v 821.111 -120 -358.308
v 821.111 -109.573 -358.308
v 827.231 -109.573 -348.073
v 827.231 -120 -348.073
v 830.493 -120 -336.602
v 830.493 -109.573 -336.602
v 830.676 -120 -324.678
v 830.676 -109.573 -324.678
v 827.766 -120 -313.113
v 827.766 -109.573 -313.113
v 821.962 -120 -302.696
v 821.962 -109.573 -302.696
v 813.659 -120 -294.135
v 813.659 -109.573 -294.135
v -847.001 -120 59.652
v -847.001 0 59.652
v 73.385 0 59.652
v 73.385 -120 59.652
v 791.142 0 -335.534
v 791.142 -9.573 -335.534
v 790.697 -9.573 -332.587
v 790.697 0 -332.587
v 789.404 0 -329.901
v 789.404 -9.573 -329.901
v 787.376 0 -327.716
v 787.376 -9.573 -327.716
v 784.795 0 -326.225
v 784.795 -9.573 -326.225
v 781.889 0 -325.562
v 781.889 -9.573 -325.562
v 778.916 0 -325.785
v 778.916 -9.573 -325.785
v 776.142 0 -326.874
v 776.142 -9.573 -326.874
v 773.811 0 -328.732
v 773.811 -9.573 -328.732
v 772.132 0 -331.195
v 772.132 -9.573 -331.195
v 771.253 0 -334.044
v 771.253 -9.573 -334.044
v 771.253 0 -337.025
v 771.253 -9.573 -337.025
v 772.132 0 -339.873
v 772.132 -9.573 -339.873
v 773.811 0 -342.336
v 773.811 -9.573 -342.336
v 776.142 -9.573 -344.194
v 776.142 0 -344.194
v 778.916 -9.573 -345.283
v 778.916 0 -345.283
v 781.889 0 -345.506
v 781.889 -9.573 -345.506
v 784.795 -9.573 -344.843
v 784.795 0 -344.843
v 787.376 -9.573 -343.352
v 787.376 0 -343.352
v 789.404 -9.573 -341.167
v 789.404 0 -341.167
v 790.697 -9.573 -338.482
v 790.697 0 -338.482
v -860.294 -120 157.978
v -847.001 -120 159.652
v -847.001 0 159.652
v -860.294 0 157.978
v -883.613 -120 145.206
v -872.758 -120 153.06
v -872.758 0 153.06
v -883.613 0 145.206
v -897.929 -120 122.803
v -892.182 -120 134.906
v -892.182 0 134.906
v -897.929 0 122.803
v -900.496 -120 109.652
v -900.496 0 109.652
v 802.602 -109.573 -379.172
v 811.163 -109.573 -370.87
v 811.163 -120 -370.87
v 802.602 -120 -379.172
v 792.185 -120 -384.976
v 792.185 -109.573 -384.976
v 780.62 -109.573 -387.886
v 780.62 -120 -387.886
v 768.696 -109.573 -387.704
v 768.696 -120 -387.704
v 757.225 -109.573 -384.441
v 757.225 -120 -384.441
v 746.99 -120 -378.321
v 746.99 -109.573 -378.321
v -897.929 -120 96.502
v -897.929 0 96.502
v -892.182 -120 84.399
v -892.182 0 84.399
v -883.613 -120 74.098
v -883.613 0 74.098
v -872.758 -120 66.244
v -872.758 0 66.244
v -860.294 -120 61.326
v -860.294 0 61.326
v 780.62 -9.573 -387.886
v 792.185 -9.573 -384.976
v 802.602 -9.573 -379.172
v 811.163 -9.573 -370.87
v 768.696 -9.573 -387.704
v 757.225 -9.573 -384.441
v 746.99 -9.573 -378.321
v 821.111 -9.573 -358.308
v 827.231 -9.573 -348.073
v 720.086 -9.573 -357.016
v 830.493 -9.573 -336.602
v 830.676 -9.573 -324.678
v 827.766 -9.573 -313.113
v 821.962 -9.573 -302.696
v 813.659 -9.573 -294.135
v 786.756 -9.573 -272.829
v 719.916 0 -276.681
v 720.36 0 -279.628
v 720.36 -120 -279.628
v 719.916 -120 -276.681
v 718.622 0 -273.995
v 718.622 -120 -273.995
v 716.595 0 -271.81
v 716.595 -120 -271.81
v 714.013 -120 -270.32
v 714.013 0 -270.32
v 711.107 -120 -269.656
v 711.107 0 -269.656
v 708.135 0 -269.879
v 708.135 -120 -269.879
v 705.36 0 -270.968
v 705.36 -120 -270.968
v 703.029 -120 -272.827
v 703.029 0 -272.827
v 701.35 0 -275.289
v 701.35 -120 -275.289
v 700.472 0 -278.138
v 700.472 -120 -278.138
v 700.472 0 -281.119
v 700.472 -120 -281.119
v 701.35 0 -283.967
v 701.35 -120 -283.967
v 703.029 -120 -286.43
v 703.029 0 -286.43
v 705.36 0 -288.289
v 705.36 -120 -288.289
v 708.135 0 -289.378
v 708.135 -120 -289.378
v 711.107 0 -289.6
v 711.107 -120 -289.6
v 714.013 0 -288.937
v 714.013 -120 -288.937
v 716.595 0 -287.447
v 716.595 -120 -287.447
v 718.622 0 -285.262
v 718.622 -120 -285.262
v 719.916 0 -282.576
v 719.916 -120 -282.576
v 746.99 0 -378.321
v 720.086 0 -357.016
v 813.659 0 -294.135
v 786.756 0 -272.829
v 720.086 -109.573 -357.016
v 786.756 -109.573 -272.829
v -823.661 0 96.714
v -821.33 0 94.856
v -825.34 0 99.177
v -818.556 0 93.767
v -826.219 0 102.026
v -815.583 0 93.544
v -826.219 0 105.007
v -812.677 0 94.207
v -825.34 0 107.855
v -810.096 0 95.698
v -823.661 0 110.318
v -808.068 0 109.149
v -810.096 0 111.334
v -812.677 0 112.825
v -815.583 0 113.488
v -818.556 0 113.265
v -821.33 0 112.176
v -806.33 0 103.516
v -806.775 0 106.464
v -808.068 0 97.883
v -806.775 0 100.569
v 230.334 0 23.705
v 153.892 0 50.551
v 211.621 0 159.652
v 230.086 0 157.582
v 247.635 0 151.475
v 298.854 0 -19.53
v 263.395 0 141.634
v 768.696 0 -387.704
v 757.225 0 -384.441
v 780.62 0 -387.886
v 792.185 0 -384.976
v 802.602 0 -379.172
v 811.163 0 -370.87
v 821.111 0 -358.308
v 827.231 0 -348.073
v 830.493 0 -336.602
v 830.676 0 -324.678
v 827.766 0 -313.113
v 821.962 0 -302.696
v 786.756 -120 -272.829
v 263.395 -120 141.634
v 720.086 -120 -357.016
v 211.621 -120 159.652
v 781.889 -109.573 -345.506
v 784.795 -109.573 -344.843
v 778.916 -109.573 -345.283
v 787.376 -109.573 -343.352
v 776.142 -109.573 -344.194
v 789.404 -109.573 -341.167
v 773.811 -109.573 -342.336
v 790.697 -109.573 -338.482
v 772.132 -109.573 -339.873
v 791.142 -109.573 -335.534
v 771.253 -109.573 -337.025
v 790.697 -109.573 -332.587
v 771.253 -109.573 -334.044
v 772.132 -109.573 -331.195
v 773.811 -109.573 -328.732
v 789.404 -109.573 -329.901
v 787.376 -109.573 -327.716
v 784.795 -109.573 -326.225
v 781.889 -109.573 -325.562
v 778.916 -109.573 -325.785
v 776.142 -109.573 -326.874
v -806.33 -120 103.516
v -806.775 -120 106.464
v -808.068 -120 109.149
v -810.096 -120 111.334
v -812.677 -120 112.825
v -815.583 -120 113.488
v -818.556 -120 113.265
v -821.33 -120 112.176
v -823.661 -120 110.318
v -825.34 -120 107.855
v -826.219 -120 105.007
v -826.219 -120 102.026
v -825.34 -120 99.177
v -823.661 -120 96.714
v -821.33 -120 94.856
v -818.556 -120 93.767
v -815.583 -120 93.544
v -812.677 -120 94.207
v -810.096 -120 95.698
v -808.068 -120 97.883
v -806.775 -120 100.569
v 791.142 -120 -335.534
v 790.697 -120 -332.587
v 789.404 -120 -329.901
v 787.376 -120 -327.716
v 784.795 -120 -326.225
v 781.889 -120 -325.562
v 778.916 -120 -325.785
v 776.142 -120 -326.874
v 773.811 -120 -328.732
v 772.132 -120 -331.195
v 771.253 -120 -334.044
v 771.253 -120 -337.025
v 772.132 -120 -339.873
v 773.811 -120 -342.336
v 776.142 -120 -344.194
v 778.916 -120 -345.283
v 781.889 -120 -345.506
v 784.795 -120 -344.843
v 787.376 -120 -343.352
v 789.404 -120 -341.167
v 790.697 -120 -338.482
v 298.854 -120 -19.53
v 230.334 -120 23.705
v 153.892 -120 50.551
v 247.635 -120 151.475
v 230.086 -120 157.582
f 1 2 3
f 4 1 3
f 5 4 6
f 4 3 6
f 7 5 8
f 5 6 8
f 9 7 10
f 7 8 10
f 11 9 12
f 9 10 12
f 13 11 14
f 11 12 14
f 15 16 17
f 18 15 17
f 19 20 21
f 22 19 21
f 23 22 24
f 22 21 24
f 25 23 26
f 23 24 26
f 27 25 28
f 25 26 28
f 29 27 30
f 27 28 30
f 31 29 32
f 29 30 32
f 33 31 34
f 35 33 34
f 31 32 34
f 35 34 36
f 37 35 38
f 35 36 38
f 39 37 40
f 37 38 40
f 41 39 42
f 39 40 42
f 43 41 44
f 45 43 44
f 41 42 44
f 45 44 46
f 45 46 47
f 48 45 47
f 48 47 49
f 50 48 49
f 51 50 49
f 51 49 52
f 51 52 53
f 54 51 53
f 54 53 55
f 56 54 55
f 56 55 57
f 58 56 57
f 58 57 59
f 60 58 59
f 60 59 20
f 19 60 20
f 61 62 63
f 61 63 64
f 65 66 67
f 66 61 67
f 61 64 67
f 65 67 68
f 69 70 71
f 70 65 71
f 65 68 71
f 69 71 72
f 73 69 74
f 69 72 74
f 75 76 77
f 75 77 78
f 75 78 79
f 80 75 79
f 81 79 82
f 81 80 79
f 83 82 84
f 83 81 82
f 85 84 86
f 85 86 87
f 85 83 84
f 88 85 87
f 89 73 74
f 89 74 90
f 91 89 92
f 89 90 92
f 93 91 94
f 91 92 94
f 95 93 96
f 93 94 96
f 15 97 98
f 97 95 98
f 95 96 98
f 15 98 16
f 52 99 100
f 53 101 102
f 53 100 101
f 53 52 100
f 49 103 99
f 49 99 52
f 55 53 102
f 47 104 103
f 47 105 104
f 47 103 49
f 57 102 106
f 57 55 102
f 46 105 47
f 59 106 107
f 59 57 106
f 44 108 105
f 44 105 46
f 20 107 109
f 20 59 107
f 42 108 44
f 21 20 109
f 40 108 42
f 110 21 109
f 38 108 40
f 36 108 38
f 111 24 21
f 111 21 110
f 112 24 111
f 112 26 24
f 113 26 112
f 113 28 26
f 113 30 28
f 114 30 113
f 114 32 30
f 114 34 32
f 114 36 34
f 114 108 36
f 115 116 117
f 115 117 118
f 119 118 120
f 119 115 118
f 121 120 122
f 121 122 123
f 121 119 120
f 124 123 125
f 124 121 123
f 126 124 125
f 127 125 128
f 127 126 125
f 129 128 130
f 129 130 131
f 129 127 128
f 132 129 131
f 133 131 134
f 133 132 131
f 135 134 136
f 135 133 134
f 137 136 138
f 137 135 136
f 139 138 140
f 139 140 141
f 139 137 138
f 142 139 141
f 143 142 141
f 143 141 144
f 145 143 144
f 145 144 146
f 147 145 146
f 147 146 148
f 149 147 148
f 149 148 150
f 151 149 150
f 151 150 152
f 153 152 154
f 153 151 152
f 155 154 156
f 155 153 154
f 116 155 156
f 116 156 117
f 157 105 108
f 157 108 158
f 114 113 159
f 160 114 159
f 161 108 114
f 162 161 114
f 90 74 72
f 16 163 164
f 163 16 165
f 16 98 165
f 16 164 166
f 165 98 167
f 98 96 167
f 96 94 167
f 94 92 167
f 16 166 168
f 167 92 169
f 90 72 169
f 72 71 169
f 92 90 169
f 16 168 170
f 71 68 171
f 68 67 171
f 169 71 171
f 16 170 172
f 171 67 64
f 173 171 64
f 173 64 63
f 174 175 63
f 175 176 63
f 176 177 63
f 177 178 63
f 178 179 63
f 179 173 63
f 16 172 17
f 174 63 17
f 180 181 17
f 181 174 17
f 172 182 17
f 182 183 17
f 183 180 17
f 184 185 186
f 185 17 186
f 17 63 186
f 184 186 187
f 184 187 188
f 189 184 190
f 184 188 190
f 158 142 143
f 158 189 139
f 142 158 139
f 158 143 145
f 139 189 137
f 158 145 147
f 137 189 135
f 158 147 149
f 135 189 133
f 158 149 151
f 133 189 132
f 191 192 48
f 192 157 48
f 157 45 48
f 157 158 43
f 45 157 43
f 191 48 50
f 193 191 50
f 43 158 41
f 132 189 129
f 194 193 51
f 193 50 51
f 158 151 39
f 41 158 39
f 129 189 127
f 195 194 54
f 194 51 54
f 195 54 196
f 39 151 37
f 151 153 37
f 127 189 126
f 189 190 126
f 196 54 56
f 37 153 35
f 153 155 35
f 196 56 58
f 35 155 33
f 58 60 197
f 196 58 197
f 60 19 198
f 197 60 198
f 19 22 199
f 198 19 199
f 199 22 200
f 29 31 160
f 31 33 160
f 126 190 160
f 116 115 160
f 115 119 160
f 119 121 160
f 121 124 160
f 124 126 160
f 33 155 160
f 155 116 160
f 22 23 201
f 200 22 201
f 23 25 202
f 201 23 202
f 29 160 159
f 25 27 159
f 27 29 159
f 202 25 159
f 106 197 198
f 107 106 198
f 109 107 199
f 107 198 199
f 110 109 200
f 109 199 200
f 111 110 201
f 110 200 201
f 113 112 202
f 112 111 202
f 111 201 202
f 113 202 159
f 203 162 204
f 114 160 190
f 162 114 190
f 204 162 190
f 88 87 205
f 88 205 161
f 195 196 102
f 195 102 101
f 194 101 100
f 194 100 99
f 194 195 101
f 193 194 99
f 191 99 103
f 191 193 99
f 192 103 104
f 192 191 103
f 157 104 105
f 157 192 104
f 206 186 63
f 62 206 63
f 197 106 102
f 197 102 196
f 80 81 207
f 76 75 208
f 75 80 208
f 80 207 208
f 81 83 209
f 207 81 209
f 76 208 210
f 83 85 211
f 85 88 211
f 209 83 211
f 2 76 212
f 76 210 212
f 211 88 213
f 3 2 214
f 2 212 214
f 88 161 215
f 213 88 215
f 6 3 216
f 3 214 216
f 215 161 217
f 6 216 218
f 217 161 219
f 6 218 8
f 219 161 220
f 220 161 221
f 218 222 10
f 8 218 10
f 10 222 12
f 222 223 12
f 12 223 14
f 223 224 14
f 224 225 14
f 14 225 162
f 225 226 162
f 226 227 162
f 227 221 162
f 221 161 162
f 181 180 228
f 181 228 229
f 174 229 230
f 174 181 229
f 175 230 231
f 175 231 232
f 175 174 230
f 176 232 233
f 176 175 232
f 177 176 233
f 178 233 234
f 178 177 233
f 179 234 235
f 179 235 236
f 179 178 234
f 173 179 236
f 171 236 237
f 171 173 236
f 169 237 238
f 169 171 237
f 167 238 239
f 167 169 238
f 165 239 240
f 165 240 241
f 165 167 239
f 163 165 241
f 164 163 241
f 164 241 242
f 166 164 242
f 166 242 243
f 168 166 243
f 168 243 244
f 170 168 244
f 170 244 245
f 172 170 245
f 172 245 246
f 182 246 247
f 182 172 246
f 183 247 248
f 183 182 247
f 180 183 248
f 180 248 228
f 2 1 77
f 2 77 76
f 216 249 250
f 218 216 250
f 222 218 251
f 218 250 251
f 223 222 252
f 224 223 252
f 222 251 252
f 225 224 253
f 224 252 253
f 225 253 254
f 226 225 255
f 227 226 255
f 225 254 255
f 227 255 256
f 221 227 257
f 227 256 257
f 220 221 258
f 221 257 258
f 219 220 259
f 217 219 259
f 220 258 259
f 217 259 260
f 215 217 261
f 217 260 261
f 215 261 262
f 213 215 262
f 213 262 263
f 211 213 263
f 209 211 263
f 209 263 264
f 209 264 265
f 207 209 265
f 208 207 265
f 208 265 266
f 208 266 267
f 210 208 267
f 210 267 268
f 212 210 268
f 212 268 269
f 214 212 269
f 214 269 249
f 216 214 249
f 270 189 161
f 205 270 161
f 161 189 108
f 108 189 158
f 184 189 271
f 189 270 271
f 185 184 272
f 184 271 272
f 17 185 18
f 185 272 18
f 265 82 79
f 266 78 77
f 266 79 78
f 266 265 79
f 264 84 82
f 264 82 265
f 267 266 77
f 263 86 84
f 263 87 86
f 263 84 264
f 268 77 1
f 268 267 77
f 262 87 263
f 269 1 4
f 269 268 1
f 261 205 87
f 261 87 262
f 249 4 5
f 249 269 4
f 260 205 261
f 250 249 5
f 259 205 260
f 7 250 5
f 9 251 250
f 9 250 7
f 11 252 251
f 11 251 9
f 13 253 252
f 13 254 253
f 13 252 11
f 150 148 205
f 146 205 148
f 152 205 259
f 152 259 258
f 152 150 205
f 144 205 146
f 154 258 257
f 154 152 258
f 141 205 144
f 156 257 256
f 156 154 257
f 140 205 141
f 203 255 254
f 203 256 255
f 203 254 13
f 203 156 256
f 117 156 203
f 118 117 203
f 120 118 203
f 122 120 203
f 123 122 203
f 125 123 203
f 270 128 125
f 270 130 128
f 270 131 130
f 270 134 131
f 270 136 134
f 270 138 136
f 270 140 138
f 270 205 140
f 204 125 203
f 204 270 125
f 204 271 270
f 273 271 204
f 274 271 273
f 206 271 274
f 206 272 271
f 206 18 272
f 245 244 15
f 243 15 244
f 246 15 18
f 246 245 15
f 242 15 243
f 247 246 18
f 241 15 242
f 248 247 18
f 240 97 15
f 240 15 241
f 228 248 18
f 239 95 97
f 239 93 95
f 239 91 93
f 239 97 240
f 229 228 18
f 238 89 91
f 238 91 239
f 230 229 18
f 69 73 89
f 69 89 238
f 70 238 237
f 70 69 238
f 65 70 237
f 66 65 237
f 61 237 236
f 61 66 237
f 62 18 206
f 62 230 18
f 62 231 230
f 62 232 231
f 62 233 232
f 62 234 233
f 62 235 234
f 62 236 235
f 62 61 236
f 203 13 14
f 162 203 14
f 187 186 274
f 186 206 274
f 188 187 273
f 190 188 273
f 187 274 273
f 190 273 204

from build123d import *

# Parameters (mm, degrees)
F0_R        = 10
F1_DEPTH    = 120
F2_T1_DEPTH = 388.0868278764
F3_R        = 83.3946881549
F4_R        = 360.5996262689
F5_W        = 10.426518289
F5_H        = 107.3879271778
F5_W_2      = 9.573481711
F6_DEPTH    = 80
F7_T1_DEPTH = 238.837194796
F7_T3_DEPTH = 237.984158218
F9_D        = 20


# Not quite as in the source:
# - a fillet or chamfer that OpenCascade refuses, or shapes differently, is made with other operations: its cross-section is extruded or revolved along the edge and cut away or added


with BuildPart() as f1:
    # F0 (on Front) → F1 (new body)
    with BuildSketch(Plane.XZ):
        Polygon((240.6433847223, 159.6522270207), (-900.6182220181, 159.6522270207), (-900.6182220181, 59.6522270207), (200.0234600665, 59.6522270207), align=None)
        with Locations((-816.3304328918, 103.5160794854)):
            Circle(F0_R, mode=Mode.SUBTRACT)
        Polygon((786.7558863362, -272.8294734313), (240.6433847223, 159.6522270207), (200.0234600665, 59.6522270207), (720.0863678131, -357.0158274528), align=None)
        with Locations((710.3598117828, -279.6283066273)):
            Circle(F0_R, mode=Mode.SUBTRACT)
    extrude(amount=F1_DEPTH)

    # F2: fillet of radius 53.6173655753 on 2 edges, made by hand

    # F2_s2 → F2_t1 (cut)
    with BuildSketch(Plane.XZ.offset(-134.0434139382)):
        with BuildLine():
            ThreePointArc((-847.0008564428, 159.6522270207), (-884.9140592305, 143.9480642331), (-900.6182220181, 106.0348614454))
            Line((-900.6182220181, 106.0348614454), (-900.6182220181, 159.6522270207))
            Line((-900.6182220181, 159.6522270207), (-847.0008564428, 159.6522270207))
        make_face()
        with BuildLine():
            ThreePointArc((-900.6182220181, 113.269592596), (-884.9140592305, 75.3563898084), (-847.0008564428, 59.6522270207))
            Line((-847.0008564428, 59.6522270207), (-900.6182220181, 59.6522270207))
            Line((-900.6182220181, 59.6522270207), (-900.6182220181, 113.269592596))
        make_face()
    extrude(amount=F2_T1_DEPTH, mode=Mode.SUBTRACT)

    # F3
    f3_edges = [f1.edges().sort_by_distance(p)[0] for p in [
        (240.643385, -60, 159.652227),
    ]]
    fillet(f3_edges, radius=F3_R)

    # F4
    f4_edges = [f1.edges().sort_by_distance(p)[0] for p in [
        (200.02346, -60, 59.652227),
    ]]
    fillet(f4_edges, radius=F4_R)

    # F5 (on face) → F6 (join)
    with BuildSketch(Plane(origin=(616.3029320724, 0, -488.0674572886), x_dir=(0, 1, 0), z_dir=(0.7839461682, 0, -0.6208288052))):
        with Locations((-114.7867408555, 220.8631330454)):
            Rectangle(F5_W, F5_H)
        with Locations((-4.7867408555, 220.8631330454)):
            Rectangle(F5_W_2, F5_H)
    extrude(amount=F6_DEPTH)

    # F7: fillet of radius 45.6821353014 on 5 edges, made by hand

    # F7_s2 → F7_t1 (cut)
    with BuildSketch(Plane.XZ.offset(-4.6318565425)):
        with BuildLine():
            ThreePointArc((811.1628467471, -370.8697969446), (780.6195529663, -387.886260073), (746.9897263442, -378.3213463908))
            Line((746.9897263442, -378.3213463908), (782.8020612687, -406.6821318691))
            Line((782.8020612687, -406.6821318691), (811.1628467471, -370.8697969446))
        make_face()
        with BuildLine():
            ThreePointArc((821.1107943135, -358.3081127721), (830.6757079957, -324.6782861501), (813.6592448673, -294.1349923693))
            Line((813.6592448673, -294.1349923693), (849.4715797918, -322.4957778476))
            Line((849.4715797918, -322.4957778476), (821.1107943135, -358.3081127721))
        make_face()
    extrude(amount=F7_T1_DEPTH, mode=Mode.SUBTRACT)

    # F7_s4 → F7_t3 (cut)
    with BuildSketch(Plane.XZ.offset(-114.2053382535)):
        with BuildLine():
            ThreePointArc((811.1628467471, -370.8697969446), (780.6195529663, -387.886260073), (746.9897263442, -378.3213463908))
            Line((746.9897263442, -378.3213463908), (782.8020612687, -406.6821318691))
            Line((782.8020612687, -406.6821318691), (811.1628467471, -370.8697969446))
        make_face()
        with BuildLine():
            ThreePointArc((813.6592448673, -294.1349923693), (830.6757079957, -324.6782861501), (821.1107943135, -358.3081127721))
            Line((821.1107943135, -358.3081127721), (849.4715797918, -322.4957778476))
            Line((849.4715797918, -322.4957778476), (813.6592448673, -294.1349923693))
        make_face()
    extrude(amount=F7_T3_DEPTH, mode=Mode.SUBTRACT)

    # F9 (through all)
    with Locations(Plane(origin=(0, 0, 0), x_dir=(-1, 0, 0), z_dir=(0, 1, 0))):
        with Locations((-781.1415195465, -335.5341851711)):
            Hole(F9_D / 2)


solid = f1.part
